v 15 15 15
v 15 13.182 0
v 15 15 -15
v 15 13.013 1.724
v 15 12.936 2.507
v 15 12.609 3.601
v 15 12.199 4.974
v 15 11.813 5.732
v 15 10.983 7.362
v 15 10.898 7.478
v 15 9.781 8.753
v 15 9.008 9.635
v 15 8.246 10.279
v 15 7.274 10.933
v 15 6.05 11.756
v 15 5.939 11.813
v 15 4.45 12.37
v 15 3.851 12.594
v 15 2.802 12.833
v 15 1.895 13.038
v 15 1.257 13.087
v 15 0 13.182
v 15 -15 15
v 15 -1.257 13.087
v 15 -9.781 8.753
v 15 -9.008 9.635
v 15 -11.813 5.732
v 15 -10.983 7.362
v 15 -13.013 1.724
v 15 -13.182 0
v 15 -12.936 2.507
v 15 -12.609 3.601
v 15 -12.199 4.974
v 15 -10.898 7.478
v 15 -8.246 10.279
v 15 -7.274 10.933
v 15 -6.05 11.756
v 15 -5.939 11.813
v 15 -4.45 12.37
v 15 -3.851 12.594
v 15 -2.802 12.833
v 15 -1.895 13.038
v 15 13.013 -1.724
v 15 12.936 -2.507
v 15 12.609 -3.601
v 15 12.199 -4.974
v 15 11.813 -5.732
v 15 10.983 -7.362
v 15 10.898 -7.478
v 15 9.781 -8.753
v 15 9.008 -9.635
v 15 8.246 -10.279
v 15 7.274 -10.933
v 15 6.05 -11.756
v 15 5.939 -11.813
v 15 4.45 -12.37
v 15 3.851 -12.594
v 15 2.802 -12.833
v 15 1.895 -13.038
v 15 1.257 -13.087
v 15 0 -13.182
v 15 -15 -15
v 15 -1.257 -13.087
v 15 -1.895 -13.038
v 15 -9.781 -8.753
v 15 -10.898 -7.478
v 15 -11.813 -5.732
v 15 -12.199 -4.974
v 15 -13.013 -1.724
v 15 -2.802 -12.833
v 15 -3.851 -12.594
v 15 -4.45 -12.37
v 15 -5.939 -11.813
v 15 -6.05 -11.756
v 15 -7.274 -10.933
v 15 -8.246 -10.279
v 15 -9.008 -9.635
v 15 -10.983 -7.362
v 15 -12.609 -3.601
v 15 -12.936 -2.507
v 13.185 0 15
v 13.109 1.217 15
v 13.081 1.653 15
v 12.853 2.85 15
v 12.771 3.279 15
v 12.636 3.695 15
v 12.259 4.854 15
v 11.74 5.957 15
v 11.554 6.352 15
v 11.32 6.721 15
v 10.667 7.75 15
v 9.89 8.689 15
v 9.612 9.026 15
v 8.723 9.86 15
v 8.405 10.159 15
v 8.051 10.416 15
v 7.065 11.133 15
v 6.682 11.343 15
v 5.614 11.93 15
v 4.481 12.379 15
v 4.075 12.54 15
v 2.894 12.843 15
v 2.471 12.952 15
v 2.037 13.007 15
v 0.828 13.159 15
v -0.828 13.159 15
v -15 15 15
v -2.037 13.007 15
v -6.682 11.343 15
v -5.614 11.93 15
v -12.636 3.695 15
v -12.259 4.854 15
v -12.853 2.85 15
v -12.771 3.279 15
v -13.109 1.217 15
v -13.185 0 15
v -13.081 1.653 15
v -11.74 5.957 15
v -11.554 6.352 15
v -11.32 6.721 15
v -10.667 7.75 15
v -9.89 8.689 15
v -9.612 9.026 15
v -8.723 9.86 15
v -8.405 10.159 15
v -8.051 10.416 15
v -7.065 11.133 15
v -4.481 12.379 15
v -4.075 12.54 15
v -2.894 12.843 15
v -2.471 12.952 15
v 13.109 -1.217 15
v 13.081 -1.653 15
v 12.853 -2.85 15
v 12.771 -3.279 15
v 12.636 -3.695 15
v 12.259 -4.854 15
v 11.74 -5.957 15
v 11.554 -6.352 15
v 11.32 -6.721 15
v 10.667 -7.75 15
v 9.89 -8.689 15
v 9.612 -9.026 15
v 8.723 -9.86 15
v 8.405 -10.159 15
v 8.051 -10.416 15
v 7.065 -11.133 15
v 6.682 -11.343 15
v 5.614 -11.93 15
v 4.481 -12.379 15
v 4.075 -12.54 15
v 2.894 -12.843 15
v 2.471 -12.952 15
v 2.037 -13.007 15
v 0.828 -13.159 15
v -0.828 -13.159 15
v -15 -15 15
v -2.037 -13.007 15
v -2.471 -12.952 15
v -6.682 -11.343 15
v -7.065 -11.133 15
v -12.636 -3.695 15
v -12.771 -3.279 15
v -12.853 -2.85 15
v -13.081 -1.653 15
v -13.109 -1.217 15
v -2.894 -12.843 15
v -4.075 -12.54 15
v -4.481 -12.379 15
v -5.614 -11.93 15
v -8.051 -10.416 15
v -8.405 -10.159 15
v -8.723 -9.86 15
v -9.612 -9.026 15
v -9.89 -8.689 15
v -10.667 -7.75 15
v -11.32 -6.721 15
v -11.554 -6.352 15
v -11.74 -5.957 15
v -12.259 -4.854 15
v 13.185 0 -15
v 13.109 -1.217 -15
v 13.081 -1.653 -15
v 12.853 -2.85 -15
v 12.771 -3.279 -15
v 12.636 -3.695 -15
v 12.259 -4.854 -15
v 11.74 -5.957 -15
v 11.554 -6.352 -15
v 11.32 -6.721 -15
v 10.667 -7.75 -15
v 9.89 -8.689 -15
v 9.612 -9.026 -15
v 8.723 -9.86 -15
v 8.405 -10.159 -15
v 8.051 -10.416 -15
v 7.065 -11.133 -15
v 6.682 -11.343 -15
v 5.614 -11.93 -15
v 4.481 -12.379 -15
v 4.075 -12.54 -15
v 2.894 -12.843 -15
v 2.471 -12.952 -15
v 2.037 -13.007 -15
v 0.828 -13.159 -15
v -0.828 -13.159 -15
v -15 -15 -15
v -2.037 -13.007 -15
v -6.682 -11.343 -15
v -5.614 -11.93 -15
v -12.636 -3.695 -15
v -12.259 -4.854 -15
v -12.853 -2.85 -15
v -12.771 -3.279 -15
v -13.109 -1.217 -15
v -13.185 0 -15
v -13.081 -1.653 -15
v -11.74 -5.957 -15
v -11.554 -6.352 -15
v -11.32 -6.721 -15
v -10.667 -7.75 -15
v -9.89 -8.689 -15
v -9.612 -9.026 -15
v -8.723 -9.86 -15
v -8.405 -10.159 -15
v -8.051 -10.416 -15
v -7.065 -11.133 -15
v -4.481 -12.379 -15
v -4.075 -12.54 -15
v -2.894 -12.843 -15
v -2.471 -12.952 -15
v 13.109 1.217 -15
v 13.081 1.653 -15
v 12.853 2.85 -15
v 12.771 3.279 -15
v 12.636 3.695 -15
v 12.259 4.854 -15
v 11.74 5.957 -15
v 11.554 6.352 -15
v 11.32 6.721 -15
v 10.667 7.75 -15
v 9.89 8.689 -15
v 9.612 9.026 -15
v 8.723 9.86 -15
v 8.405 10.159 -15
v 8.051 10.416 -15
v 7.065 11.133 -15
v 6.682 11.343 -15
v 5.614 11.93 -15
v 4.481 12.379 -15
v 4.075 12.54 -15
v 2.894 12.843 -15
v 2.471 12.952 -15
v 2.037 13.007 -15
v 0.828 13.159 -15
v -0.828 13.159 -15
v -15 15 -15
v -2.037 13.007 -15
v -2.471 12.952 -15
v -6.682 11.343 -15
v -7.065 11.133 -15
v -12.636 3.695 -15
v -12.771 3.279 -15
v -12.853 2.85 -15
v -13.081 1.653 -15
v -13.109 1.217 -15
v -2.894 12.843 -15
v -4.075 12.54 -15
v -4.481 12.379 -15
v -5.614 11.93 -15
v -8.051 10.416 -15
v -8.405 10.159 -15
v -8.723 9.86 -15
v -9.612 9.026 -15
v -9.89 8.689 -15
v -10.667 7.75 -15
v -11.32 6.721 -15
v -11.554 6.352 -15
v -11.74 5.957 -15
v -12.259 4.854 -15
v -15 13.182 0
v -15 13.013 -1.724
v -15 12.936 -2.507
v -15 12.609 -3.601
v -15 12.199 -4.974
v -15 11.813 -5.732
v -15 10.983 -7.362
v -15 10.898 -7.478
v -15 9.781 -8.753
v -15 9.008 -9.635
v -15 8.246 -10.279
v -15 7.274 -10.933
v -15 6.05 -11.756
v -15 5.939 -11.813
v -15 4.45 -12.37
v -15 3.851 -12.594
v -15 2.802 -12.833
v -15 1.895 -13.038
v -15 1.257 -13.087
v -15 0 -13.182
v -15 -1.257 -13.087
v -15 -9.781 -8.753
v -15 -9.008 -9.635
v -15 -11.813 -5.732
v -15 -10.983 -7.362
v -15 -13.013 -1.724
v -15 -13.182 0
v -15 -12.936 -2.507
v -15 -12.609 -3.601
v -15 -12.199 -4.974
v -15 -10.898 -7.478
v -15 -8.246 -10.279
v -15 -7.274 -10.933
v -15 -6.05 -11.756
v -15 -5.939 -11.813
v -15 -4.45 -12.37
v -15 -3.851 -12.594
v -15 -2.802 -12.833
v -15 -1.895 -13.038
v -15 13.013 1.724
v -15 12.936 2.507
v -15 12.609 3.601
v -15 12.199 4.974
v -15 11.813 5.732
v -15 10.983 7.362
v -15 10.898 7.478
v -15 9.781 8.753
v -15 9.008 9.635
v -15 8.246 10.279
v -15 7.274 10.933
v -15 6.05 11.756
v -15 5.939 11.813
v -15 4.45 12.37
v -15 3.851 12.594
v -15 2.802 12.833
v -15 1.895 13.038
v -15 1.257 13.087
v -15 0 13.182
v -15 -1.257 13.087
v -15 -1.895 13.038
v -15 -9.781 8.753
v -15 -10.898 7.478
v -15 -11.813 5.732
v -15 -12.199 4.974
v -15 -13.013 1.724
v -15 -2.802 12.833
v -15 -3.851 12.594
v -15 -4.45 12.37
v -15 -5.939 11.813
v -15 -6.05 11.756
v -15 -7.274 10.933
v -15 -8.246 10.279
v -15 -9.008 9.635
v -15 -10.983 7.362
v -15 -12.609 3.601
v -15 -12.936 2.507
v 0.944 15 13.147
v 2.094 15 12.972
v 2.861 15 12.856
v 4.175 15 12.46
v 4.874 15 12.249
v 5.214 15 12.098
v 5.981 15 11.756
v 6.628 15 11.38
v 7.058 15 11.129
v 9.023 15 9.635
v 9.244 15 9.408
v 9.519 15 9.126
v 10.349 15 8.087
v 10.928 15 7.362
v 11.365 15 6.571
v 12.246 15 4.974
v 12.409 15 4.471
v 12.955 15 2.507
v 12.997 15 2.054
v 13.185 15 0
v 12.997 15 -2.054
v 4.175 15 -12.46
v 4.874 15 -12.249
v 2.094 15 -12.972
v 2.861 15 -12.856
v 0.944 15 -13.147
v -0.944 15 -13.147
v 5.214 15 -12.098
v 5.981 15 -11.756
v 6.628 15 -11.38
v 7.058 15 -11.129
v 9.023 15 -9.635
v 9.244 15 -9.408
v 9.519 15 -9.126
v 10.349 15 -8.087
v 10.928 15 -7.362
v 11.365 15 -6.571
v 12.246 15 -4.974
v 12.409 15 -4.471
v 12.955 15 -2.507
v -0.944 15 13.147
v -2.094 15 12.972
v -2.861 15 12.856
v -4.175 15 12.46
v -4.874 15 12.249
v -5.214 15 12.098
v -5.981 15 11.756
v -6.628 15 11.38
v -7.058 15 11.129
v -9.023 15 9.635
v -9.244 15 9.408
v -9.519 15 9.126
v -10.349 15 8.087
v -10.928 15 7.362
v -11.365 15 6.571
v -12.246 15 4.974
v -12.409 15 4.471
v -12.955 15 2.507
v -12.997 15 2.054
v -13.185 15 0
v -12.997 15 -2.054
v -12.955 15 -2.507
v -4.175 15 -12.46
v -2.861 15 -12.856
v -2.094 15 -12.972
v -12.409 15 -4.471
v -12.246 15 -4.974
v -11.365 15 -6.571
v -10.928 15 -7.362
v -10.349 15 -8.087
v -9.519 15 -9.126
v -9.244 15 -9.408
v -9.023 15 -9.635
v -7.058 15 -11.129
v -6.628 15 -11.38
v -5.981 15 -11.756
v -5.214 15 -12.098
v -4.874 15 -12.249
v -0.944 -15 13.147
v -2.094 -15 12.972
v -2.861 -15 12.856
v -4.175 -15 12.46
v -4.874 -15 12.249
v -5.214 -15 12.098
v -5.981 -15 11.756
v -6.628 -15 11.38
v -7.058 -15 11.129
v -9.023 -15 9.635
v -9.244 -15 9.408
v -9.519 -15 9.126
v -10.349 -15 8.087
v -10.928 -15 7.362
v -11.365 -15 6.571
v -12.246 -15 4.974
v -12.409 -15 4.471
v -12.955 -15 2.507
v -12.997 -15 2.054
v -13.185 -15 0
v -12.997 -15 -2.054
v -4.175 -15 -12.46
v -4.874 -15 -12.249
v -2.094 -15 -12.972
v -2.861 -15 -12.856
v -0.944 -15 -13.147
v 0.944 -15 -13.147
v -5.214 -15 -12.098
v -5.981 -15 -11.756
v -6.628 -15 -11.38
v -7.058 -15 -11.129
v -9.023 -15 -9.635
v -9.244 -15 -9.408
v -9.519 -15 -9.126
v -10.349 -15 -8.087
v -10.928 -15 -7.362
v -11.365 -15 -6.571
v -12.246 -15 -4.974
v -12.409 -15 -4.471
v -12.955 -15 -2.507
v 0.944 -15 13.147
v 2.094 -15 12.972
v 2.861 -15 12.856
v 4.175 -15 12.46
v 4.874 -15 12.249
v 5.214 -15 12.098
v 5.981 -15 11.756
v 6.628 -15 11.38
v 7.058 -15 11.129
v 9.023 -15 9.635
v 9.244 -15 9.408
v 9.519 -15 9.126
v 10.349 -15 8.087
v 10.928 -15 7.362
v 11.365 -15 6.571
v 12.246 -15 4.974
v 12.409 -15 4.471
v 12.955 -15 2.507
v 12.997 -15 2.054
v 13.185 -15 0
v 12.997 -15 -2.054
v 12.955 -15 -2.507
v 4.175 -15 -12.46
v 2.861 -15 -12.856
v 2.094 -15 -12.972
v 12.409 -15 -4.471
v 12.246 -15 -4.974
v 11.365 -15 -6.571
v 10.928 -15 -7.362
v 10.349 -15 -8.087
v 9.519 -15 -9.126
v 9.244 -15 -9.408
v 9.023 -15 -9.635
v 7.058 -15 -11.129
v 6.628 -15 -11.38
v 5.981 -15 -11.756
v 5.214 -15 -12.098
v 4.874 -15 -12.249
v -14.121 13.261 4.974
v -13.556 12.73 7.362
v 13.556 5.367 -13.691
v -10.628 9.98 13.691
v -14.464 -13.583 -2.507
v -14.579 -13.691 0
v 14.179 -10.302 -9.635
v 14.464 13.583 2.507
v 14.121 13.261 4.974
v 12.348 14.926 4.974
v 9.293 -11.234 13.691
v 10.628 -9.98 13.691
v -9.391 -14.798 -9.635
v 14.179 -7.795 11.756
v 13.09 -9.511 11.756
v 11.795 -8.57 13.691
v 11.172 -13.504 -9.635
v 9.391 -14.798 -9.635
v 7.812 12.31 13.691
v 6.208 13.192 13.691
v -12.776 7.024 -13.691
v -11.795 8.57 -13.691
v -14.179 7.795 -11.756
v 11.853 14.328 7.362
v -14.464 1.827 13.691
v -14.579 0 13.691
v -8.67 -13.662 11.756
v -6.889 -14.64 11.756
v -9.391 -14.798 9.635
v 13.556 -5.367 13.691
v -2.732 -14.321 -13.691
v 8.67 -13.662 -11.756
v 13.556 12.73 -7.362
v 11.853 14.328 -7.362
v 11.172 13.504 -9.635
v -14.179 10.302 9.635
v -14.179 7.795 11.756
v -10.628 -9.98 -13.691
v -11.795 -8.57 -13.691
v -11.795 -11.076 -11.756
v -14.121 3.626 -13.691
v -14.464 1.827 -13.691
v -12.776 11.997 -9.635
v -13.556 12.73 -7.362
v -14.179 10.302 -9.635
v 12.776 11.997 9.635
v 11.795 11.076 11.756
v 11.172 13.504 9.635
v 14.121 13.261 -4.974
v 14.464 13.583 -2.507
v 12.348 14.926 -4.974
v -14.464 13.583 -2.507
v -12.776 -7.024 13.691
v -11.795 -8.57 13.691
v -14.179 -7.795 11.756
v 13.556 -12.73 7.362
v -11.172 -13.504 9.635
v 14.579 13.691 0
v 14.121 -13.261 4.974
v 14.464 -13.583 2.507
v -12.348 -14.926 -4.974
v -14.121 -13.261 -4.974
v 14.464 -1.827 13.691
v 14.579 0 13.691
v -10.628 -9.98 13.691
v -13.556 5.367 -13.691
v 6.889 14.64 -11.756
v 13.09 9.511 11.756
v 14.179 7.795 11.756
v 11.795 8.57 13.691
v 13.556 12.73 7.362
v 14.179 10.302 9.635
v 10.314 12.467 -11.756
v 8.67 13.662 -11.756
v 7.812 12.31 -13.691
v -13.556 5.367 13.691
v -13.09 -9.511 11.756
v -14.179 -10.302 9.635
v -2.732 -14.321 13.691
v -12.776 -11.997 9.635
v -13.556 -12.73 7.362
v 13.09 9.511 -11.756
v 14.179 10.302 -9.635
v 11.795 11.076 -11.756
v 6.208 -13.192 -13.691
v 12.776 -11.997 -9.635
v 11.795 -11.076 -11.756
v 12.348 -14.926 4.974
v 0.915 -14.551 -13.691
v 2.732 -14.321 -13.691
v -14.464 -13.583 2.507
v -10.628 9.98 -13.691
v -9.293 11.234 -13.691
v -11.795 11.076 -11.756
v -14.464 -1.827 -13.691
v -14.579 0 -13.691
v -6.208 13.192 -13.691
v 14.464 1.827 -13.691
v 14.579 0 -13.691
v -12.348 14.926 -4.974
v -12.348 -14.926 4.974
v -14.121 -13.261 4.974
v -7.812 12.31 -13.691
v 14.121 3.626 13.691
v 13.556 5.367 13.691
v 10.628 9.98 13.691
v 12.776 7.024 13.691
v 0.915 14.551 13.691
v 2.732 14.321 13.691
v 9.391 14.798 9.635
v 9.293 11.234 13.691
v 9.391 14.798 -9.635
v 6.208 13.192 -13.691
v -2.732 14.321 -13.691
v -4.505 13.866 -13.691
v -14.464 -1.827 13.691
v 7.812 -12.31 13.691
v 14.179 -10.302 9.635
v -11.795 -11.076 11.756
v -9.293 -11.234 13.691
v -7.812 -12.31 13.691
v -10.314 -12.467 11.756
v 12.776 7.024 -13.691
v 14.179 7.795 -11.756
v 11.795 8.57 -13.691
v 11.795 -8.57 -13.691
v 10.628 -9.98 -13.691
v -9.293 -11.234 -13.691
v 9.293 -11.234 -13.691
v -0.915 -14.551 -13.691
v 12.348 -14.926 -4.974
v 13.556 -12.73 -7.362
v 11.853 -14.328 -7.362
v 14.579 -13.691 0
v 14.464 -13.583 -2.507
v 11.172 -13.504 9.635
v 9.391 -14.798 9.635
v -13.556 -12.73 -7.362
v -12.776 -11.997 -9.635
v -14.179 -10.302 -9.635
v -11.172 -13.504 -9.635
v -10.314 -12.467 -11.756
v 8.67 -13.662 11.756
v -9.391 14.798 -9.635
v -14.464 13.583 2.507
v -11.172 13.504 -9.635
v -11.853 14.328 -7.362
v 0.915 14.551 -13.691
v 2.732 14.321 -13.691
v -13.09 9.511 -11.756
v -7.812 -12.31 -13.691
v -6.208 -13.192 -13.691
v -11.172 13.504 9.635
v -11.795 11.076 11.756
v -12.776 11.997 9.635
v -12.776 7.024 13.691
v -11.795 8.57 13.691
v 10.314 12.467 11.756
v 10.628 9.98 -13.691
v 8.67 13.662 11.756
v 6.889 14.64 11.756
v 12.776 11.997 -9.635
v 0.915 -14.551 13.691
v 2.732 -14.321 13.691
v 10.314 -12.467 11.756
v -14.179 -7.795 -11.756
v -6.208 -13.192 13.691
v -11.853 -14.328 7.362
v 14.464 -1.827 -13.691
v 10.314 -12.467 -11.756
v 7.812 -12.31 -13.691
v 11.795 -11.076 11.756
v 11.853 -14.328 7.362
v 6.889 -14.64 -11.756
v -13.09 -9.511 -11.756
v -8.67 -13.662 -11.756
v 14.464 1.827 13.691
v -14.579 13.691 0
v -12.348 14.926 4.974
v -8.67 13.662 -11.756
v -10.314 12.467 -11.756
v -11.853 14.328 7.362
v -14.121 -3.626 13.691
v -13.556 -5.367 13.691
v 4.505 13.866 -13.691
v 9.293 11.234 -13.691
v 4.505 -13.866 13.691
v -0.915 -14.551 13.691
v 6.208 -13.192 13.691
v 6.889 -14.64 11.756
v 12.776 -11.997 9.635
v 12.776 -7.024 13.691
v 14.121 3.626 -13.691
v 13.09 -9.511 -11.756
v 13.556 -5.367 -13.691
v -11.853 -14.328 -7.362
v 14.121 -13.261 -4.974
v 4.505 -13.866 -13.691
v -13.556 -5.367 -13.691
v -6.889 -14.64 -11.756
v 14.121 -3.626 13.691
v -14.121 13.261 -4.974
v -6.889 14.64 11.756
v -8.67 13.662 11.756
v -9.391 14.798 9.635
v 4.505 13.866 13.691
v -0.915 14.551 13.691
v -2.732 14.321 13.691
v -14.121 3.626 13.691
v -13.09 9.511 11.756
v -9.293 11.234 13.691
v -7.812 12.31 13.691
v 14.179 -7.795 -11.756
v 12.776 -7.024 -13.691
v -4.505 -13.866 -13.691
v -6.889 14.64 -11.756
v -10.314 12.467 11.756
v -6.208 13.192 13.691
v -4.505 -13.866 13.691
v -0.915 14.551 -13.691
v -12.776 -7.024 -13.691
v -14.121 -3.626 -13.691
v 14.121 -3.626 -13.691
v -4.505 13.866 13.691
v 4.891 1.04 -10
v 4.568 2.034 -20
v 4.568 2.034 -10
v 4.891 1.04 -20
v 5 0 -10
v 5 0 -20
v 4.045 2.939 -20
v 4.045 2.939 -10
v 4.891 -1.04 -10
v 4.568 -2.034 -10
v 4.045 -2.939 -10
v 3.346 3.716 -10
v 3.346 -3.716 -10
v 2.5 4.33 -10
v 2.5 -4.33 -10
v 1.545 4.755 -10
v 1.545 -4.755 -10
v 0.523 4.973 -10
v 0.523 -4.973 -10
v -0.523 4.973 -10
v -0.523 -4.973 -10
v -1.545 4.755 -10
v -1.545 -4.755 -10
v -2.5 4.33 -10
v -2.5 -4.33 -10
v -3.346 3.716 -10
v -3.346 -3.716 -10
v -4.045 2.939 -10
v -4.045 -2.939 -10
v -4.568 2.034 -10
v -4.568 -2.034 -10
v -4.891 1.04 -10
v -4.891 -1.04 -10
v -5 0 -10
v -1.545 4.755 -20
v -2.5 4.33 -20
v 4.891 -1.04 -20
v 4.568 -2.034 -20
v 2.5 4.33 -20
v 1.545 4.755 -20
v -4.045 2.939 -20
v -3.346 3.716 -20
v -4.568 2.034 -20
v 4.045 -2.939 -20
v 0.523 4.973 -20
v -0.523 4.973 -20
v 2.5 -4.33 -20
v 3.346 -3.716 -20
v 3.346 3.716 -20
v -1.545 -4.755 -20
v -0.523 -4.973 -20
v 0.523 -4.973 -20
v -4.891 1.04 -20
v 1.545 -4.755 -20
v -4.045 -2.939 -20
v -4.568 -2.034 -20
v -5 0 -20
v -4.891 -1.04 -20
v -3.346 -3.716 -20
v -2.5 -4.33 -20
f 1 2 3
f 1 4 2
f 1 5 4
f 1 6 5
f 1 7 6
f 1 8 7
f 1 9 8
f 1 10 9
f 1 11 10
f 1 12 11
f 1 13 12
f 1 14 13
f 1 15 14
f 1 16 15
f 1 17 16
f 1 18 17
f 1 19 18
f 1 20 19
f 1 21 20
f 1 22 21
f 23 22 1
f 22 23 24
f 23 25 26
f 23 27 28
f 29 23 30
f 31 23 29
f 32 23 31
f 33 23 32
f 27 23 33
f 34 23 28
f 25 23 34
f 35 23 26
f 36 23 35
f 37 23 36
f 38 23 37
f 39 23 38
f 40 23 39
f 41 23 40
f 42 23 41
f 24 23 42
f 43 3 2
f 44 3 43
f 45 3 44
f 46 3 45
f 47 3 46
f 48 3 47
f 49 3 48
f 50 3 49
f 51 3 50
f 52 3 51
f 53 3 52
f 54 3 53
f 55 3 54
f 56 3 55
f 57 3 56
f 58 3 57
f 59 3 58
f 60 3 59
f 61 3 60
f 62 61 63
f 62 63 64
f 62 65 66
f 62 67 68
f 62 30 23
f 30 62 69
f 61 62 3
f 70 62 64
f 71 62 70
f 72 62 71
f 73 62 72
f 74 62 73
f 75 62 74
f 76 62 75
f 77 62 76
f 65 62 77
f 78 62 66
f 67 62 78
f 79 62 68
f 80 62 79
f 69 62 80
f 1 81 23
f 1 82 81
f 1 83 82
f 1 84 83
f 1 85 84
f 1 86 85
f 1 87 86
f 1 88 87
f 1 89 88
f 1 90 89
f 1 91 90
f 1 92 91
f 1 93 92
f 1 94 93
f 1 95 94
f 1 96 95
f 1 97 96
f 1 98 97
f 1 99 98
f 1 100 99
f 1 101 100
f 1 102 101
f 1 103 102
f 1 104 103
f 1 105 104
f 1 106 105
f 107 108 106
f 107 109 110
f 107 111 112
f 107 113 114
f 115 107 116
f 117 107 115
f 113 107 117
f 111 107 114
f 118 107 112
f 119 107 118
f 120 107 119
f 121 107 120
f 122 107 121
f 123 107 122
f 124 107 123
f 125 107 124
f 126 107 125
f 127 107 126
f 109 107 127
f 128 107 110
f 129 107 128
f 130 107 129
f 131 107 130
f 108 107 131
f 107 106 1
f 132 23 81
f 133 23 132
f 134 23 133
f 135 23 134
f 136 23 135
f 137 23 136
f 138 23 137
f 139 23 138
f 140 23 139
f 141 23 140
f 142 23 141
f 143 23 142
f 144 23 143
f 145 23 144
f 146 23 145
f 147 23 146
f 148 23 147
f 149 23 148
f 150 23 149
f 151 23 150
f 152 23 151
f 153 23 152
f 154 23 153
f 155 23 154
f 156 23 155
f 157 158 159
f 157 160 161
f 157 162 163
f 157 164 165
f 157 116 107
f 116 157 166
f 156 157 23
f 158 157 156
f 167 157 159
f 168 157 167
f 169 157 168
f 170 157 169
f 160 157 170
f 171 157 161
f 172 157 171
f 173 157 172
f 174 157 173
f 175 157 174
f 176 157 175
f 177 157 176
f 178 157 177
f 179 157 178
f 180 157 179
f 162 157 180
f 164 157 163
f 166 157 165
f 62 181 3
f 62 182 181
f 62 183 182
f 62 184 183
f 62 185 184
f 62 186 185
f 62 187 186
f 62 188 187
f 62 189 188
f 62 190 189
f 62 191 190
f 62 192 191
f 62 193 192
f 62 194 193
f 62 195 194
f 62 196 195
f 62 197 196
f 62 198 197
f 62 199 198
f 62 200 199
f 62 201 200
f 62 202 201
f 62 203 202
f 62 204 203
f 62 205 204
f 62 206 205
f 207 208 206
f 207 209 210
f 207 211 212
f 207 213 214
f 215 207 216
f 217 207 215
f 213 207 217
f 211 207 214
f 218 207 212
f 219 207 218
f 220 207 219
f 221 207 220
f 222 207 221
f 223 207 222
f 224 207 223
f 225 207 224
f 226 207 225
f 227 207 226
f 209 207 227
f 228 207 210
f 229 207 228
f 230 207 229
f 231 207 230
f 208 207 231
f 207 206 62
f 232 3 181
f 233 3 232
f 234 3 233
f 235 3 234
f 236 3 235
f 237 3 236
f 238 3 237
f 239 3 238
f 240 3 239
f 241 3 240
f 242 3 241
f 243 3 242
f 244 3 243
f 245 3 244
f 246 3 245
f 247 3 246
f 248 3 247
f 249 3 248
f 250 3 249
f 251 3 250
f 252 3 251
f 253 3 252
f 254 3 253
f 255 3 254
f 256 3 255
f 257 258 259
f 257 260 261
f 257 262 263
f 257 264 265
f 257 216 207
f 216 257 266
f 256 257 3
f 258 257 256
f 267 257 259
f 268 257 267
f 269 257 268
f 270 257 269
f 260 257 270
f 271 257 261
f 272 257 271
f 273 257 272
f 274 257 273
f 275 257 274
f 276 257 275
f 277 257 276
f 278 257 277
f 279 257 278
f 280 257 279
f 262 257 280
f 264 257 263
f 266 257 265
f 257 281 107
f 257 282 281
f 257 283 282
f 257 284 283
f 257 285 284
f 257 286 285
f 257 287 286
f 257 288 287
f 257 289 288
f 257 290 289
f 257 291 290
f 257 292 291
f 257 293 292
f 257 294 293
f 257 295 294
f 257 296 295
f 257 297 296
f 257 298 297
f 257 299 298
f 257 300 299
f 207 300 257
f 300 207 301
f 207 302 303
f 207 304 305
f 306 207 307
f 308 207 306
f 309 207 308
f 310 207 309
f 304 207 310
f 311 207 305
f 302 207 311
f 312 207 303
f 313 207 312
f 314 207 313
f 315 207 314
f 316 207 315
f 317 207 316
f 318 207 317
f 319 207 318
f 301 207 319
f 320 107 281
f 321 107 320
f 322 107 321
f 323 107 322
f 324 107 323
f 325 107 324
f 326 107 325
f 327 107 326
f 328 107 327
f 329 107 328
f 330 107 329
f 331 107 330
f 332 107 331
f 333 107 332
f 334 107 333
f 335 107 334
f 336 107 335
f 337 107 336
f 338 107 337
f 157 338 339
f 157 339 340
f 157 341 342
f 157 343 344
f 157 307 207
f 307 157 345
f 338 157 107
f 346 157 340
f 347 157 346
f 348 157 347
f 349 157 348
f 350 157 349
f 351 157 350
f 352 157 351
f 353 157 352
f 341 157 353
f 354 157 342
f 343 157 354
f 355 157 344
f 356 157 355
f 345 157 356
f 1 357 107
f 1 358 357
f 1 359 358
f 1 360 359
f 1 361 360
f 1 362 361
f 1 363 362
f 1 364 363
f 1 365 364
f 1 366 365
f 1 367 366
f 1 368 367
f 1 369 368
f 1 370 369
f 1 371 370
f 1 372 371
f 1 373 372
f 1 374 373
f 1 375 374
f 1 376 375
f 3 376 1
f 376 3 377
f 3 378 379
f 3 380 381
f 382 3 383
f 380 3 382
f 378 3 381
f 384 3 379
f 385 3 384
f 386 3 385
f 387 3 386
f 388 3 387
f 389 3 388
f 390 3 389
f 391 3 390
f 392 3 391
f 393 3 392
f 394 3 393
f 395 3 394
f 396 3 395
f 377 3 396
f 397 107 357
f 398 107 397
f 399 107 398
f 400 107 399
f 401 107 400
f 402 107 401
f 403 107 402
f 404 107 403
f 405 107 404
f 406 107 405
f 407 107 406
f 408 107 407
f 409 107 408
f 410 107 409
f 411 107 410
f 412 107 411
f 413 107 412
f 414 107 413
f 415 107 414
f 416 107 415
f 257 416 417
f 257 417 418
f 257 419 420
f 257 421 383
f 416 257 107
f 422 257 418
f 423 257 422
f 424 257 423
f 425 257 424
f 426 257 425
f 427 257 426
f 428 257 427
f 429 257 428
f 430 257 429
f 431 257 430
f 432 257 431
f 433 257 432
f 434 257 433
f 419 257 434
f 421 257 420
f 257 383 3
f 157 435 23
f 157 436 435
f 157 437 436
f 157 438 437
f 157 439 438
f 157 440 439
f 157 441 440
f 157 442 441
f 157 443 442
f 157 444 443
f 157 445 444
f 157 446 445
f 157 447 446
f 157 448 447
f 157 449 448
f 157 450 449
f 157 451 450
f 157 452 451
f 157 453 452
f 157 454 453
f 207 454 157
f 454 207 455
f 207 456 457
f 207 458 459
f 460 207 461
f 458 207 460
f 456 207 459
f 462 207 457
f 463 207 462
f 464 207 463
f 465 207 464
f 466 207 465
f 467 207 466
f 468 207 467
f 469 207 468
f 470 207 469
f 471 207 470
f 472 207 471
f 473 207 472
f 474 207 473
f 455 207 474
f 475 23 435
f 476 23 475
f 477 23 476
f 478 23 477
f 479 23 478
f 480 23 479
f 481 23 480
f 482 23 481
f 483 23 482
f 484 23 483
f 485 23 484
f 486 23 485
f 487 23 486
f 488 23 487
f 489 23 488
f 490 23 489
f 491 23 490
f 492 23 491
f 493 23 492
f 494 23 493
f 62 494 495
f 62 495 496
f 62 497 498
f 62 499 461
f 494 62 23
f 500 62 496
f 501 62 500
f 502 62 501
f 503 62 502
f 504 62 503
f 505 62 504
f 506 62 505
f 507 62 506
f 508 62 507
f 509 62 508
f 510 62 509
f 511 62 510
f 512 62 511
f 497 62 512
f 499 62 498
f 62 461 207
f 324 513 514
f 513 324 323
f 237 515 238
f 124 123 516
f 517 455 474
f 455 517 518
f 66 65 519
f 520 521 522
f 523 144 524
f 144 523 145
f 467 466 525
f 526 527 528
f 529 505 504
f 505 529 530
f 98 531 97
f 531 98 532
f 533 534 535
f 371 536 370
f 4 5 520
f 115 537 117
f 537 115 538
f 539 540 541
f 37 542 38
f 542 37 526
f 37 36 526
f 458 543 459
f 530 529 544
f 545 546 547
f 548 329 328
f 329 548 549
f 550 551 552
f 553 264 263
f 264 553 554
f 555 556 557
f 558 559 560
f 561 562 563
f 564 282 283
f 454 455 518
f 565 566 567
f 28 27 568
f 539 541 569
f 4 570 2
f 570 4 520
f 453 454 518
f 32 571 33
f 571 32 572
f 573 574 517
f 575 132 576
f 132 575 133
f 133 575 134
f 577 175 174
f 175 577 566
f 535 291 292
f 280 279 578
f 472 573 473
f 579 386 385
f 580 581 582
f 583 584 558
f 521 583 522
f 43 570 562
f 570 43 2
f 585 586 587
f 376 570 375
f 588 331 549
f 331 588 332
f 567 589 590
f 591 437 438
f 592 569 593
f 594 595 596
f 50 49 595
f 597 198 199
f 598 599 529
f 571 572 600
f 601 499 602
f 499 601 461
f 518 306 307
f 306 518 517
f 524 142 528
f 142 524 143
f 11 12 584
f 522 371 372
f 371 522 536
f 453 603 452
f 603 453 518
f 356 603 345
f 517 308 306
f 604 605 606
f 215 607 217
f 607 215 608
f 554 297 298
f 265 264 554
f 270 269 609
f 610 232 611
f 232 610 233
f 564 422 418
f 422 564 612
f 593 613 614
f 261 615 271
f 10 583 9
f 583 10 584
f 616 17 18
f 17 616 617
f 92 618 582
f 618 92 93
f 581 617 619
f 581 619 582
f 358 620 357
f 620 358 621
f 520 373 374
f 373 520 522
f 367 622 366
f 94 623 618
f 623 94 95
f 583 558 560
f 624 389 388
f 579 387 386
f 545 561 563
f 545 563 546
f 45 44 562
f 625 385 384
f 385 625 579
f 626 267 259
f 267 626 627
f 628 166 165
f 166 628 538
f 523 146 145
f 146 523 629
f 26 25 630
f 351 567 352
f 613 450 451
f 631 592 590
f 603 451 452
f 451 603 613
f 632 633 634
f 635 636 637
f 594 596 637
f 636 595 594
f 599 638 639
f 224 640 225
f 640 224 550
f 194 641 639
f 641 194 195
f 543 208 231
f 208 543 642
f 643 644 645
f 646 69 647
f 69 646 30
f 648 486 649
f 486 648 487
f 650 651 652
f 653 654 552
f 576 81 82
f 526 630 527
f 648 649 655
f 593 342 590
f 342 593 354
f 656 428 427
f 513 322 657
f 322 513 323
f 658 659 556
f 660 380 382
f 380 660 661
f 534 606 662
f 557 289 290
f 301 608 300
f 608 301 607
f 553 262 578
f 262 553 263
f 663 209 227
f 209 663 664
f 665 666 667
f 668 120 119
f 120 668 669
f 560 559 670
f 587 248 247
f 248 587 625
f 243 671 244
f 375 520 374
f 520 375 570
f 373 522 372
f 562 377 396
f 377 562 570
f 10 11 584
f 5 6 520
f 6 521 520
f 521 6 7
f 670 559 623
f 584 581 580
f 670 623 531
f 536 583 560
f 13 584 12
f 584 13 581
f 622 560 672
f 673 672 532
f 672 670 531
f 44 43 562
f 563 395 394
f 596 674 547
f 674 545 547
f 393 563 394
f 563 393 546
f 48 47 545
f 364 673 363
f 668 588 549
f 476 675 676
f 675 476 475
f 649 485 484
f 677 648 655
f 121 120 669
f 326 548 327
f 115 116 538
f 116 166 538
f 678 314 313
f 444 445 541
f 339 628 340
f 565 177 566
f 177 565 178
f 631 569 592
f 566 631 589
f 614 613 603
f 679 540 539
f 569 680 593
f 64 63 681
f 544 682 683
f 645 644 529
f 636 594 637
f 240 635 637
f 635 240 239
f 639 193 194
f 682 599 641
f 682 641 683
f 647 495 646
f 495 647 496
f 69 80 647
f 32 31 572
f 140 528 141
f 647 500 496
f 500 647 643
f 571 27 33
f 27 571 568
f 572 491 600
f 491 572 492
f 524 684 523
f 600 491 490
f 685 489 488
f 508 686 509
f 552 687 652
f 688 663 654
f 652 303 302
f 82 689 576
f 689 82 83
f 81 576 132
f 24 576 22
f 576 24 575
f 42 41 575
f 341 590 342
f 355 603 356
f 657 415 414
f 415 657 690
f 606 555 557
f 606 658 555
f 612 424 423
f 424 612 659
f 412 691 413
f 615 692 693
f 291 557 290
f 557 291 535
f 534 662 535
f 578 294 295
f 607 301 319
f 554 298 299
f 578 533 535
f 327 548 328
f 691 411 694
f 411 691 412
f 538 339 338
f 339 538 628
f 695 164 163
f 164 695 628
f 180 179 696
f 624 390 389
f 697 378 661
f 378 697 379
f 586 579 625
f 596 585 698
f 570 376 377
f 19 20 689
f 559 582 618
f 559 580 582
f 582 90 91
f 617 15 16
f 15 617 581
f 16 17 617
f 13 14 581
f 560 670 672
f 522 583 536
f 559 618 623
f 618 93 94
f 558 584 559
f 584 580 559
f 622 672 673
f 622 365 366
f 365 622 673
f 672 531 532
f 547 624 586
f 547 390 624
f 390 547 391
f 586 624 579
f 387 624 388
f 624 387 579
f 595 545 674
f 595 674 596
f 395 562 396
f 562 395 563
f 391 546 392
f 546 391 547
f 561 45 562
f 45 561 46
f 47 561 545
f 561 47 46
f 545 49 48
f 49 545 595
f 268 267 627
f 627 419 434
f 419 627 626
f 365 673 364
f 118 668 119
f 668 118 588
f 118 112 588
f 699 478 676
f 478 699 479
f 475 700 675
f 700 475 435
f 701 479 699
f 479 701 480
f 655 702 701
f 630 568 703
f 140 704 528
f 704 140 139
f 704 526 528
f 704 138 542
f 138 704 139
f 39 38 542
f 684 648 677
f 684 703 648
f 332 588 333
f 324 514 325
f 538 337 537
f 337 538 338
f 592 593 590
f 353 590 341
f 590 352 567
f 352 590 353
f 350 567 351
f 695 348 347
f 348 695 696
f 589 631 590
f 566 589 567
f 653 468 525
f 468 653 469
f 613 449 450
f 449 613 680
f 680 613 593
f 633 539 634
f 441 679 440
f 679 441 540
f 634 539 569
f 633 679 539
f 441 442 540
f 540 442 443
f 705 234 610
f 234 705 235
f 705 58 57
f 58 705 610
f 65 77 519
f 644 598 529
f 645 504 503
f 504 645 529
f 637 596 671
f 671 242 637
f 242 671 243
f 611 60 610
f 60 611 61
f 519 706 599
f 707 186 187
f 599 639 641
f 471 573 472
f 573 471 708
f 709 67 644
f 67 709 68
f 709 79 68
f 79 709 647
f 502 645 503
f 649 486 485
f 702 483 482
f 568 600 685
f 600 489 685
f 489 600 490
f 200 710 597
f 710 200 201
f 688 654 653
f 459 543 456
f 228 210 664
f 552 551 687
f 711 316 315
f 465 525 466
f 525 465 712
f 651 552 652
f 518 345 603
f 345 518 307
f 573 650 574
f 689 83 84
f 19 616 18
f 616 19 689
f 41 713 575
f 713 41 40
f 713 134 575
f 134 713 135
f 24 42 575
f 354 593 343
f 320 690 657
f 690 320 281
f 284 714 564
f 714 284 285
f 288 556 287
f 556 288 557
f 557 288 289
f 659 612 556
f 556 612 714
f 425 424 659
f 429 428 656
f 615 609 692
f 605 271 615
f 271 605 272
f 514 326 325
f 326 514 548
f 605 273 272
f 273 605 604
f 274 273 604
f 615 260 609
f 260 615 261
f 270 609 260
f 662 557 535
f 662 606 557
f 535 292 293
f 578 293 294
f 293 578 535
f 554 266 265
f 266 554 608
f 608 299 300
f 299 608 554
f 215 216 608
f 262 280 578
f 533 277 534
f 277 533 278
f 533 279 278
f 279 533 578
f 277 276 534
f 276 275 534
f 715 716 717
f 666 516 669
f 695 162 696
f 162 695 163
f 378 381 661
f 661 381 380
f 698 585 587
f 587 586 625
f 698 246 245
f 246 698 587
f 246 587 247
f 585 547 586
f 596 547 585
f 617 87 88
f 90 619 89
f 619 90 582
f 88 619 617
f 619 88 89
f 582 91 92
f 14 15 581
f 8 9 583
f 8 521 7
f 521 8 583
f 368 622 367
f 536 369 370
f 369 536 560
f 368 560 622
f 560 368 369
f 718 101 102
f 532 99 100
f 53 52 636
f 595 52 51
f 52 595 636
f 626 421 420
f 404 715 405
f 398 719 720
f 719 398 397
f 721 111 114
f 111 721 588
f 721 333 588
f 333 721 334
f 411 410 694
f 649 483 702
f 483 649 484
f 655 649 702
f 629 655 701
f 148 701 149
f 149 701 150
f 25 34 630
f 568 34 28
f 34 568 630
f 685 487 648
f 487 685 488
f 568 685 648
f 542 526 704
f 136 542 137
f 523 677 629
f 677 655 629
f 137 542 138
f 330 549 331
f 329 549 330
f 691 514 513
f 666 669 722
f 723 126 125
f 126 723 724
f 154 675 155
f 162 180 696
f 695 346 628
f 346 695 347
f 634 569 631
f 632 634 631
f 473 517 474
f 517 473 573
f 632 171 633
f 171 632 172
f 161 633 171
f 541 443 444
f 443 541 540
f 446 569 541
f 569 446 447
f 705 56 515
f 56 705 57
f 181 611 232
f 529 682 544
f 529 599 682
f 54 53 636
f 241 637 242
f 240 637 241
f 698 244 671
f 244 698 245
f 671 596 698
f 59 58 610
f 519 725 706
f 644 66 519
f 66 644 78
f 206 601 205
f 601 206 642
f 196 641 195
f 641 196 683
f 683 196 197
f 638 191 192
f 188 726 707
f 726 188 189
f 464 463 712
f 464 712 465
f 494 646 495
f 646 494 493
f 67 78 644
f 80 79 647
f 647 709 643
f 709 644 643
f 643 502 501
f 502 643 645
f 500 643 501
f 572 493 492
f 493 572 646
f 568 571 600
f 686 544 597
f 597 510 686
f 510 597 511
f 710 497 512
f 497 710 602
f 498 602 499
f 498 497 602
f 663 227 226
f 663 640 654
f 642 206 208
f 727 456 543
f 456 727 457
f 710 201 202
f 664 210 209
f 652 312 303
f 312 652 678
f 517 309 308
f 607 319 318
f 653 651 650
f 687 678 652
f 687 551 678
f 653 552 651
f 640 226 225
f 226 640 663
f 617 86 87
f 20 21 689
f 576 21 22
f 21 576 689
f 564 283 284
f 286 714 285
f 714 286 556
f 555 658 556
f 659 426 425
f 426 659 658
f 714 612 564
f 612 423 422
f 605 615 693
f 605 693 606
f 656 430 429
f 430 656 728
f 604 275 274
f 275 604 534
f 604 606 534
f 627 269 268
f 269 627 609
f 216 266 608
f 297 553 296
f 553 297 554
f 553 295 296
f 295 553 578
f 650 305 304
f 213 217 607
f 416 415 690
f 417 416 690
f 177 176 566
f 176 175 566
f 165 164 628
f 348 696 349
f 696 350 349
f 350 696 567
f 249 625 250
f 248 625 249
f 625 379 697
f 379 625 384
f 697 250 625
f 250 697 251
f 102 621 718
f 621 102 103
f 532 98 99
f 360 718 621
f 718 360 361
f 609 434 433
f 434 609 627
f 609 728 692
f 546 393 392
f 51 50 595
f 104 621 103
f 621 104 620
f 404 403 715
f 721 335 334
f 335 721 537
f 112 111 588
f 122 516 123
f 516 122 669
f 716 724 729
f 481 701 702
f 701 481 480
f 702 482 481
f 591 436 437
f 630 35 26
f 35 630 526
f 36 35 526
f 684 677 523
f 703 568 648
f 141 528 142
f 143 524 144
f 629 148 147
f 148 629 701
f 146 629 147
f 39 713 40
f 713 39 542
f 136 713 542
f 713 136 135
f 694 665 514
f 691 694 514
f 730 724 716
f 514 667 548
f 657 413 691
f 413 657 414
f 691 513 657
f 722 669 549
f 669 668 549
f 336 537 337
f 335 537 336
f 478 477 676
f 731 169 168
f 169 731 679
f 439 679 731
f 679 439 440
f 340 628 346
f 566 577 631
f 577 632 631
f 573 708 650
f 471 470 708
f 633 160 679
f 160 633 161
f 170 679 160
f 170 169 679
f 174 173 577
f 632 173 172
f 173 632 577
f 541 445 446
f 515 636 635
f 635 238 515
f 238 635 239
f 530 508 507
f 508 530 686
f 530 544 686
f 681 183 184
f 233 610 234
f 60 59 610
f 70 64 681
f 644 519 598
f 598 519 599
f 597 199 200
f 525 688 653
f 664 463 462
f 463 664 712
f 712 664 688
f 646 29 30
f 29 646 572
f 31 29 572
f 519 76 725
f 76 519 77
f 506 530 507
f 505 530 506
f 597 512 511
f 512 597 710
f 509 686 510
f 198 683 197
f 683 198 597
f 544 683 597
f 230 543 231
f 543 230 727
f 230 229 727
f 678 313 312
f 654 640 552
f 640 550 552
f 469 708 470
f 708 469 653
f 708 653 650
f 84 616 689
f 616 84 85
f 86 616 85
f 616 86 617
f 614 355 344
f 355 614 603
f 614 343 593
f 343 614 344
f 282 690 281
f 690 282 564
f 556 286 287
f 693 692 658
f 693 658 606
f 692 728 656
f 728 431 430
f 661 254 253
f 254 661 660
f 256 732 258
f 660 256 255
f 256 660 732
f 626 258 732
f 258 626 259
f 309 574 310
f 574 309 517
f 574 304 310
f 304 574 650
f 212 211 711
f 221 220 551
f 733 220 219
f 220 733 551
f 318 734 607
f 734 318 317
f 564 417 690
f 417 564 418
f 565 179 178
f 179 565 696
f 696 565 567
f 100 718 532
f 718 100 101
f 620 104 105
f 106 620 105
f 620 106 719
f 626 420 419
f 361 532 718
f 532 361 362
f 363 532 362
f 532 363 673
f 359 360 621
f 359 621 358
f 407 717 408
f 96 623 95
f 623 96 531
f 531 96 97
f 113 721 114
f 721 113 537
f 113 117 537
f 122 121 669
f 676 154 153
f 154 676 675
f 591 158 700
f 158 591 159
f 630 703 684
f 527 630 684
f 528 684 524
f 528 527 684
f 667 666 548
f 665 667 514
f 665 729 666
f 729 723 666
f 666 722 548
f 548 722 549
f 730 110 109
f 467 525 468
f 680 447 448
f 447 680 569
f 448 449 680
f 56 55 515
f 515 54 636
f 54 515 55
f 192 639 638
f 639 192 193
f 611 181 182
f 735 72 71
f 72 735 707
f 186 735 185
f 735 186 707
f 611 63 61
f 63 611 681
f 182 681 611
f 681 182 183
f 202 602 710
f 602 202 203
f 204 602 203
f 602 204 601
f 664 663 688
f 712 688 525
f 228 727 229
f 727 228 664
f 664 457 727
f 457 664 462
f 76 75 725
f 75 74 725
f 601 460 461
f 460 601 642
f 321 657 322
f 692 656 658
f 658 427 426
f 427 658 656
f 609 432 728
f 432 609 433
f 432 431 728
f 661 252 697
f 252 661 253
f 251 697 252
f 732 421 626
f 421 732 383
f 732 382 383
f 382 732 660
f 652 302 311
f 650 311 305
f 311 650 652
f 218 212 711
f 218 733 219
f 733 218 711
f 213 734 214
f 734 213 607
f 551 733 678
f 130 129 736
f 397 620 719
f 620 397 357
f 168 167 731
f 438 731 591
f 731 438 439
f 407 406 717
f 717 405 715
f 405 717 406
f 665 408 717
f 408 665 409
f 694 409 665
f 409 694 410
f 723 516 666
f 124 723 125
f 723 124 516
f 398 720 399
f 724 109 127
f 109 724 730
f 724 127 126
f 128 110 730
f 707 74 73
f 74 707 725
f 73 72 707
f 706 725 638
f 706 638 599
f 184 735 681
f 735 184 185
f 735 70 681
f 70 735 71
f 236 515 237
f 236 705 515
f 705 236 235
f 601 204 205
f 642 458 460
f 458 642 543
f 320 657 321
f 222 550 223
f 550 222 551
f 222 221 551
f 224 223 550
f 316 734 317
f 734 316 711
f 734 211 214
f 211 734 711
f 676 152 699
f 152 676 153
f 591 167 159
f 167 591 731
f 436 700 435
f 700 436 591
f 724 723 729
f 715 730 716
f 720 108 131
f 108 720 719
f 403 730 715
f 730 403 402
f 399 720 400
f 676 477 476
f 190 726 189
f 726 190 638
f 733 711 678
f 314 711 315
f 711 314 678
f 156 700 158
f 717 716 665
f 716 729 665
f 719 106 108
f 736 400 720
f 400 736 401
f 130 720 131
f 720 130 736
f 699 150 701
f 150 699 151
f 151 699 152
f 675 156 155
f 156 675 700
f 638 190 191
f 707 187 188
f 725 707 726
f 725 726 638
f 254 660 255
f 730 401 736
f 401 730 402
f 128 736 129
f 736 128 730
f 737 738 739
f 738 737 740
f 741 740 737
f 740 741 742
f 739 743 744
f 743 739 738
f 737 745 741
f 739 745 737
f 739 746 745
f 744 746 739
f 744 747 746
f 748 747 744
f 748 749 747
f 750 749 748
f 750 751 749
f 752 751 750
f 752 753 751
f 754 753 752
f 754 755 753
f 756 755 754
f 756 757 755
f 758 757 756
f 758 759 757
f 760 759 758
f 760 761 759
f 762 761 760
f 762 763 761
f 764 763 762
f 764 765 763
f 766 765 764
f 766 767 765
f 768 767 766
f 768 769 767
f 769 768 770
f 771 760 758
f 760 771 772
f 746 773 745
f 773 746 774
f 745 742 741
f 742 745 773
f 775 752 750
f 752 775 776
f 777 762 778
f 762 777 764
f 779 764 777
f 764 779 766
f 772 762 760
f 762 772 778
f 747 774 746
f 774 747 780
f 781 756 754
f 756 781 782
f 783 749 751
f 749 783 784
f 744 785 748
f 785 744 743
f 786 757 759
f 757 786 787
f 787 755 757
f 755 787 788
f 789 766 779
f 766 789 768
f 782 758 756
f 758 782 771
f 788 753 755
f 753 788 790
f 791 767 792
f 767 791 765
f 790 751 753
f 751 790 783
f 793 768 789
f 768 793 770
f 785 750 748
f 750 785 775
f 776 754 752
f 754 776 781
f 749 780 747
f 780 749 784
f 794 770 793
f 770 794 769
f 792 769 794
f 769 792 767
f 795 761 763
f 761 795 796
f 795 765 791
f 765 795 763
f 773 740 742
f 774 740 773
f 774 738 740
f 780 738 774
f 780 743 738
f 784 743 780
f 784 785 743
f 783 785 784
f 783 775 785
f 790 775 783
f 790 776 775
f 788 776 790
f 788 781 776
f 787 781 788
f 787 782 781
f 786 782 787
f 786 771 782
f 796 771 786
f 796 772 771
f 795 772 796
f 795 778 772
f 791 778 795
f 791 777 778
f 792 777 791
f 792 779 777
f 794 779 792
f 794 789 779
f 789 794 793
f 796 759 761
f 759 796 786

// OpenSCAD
// Simple test OpenSCAD file
// Creates a cube and a sphere

difference() {
    // Main cube
    cube([30, 30, 30], center=true);

    // Sphere to subtract from the cube
    sphere(r=20, $fn=50);
}

// Add a cylinder
translate([0, 0, -20])
    cylinder(h=10, r=5, $fn=30);
